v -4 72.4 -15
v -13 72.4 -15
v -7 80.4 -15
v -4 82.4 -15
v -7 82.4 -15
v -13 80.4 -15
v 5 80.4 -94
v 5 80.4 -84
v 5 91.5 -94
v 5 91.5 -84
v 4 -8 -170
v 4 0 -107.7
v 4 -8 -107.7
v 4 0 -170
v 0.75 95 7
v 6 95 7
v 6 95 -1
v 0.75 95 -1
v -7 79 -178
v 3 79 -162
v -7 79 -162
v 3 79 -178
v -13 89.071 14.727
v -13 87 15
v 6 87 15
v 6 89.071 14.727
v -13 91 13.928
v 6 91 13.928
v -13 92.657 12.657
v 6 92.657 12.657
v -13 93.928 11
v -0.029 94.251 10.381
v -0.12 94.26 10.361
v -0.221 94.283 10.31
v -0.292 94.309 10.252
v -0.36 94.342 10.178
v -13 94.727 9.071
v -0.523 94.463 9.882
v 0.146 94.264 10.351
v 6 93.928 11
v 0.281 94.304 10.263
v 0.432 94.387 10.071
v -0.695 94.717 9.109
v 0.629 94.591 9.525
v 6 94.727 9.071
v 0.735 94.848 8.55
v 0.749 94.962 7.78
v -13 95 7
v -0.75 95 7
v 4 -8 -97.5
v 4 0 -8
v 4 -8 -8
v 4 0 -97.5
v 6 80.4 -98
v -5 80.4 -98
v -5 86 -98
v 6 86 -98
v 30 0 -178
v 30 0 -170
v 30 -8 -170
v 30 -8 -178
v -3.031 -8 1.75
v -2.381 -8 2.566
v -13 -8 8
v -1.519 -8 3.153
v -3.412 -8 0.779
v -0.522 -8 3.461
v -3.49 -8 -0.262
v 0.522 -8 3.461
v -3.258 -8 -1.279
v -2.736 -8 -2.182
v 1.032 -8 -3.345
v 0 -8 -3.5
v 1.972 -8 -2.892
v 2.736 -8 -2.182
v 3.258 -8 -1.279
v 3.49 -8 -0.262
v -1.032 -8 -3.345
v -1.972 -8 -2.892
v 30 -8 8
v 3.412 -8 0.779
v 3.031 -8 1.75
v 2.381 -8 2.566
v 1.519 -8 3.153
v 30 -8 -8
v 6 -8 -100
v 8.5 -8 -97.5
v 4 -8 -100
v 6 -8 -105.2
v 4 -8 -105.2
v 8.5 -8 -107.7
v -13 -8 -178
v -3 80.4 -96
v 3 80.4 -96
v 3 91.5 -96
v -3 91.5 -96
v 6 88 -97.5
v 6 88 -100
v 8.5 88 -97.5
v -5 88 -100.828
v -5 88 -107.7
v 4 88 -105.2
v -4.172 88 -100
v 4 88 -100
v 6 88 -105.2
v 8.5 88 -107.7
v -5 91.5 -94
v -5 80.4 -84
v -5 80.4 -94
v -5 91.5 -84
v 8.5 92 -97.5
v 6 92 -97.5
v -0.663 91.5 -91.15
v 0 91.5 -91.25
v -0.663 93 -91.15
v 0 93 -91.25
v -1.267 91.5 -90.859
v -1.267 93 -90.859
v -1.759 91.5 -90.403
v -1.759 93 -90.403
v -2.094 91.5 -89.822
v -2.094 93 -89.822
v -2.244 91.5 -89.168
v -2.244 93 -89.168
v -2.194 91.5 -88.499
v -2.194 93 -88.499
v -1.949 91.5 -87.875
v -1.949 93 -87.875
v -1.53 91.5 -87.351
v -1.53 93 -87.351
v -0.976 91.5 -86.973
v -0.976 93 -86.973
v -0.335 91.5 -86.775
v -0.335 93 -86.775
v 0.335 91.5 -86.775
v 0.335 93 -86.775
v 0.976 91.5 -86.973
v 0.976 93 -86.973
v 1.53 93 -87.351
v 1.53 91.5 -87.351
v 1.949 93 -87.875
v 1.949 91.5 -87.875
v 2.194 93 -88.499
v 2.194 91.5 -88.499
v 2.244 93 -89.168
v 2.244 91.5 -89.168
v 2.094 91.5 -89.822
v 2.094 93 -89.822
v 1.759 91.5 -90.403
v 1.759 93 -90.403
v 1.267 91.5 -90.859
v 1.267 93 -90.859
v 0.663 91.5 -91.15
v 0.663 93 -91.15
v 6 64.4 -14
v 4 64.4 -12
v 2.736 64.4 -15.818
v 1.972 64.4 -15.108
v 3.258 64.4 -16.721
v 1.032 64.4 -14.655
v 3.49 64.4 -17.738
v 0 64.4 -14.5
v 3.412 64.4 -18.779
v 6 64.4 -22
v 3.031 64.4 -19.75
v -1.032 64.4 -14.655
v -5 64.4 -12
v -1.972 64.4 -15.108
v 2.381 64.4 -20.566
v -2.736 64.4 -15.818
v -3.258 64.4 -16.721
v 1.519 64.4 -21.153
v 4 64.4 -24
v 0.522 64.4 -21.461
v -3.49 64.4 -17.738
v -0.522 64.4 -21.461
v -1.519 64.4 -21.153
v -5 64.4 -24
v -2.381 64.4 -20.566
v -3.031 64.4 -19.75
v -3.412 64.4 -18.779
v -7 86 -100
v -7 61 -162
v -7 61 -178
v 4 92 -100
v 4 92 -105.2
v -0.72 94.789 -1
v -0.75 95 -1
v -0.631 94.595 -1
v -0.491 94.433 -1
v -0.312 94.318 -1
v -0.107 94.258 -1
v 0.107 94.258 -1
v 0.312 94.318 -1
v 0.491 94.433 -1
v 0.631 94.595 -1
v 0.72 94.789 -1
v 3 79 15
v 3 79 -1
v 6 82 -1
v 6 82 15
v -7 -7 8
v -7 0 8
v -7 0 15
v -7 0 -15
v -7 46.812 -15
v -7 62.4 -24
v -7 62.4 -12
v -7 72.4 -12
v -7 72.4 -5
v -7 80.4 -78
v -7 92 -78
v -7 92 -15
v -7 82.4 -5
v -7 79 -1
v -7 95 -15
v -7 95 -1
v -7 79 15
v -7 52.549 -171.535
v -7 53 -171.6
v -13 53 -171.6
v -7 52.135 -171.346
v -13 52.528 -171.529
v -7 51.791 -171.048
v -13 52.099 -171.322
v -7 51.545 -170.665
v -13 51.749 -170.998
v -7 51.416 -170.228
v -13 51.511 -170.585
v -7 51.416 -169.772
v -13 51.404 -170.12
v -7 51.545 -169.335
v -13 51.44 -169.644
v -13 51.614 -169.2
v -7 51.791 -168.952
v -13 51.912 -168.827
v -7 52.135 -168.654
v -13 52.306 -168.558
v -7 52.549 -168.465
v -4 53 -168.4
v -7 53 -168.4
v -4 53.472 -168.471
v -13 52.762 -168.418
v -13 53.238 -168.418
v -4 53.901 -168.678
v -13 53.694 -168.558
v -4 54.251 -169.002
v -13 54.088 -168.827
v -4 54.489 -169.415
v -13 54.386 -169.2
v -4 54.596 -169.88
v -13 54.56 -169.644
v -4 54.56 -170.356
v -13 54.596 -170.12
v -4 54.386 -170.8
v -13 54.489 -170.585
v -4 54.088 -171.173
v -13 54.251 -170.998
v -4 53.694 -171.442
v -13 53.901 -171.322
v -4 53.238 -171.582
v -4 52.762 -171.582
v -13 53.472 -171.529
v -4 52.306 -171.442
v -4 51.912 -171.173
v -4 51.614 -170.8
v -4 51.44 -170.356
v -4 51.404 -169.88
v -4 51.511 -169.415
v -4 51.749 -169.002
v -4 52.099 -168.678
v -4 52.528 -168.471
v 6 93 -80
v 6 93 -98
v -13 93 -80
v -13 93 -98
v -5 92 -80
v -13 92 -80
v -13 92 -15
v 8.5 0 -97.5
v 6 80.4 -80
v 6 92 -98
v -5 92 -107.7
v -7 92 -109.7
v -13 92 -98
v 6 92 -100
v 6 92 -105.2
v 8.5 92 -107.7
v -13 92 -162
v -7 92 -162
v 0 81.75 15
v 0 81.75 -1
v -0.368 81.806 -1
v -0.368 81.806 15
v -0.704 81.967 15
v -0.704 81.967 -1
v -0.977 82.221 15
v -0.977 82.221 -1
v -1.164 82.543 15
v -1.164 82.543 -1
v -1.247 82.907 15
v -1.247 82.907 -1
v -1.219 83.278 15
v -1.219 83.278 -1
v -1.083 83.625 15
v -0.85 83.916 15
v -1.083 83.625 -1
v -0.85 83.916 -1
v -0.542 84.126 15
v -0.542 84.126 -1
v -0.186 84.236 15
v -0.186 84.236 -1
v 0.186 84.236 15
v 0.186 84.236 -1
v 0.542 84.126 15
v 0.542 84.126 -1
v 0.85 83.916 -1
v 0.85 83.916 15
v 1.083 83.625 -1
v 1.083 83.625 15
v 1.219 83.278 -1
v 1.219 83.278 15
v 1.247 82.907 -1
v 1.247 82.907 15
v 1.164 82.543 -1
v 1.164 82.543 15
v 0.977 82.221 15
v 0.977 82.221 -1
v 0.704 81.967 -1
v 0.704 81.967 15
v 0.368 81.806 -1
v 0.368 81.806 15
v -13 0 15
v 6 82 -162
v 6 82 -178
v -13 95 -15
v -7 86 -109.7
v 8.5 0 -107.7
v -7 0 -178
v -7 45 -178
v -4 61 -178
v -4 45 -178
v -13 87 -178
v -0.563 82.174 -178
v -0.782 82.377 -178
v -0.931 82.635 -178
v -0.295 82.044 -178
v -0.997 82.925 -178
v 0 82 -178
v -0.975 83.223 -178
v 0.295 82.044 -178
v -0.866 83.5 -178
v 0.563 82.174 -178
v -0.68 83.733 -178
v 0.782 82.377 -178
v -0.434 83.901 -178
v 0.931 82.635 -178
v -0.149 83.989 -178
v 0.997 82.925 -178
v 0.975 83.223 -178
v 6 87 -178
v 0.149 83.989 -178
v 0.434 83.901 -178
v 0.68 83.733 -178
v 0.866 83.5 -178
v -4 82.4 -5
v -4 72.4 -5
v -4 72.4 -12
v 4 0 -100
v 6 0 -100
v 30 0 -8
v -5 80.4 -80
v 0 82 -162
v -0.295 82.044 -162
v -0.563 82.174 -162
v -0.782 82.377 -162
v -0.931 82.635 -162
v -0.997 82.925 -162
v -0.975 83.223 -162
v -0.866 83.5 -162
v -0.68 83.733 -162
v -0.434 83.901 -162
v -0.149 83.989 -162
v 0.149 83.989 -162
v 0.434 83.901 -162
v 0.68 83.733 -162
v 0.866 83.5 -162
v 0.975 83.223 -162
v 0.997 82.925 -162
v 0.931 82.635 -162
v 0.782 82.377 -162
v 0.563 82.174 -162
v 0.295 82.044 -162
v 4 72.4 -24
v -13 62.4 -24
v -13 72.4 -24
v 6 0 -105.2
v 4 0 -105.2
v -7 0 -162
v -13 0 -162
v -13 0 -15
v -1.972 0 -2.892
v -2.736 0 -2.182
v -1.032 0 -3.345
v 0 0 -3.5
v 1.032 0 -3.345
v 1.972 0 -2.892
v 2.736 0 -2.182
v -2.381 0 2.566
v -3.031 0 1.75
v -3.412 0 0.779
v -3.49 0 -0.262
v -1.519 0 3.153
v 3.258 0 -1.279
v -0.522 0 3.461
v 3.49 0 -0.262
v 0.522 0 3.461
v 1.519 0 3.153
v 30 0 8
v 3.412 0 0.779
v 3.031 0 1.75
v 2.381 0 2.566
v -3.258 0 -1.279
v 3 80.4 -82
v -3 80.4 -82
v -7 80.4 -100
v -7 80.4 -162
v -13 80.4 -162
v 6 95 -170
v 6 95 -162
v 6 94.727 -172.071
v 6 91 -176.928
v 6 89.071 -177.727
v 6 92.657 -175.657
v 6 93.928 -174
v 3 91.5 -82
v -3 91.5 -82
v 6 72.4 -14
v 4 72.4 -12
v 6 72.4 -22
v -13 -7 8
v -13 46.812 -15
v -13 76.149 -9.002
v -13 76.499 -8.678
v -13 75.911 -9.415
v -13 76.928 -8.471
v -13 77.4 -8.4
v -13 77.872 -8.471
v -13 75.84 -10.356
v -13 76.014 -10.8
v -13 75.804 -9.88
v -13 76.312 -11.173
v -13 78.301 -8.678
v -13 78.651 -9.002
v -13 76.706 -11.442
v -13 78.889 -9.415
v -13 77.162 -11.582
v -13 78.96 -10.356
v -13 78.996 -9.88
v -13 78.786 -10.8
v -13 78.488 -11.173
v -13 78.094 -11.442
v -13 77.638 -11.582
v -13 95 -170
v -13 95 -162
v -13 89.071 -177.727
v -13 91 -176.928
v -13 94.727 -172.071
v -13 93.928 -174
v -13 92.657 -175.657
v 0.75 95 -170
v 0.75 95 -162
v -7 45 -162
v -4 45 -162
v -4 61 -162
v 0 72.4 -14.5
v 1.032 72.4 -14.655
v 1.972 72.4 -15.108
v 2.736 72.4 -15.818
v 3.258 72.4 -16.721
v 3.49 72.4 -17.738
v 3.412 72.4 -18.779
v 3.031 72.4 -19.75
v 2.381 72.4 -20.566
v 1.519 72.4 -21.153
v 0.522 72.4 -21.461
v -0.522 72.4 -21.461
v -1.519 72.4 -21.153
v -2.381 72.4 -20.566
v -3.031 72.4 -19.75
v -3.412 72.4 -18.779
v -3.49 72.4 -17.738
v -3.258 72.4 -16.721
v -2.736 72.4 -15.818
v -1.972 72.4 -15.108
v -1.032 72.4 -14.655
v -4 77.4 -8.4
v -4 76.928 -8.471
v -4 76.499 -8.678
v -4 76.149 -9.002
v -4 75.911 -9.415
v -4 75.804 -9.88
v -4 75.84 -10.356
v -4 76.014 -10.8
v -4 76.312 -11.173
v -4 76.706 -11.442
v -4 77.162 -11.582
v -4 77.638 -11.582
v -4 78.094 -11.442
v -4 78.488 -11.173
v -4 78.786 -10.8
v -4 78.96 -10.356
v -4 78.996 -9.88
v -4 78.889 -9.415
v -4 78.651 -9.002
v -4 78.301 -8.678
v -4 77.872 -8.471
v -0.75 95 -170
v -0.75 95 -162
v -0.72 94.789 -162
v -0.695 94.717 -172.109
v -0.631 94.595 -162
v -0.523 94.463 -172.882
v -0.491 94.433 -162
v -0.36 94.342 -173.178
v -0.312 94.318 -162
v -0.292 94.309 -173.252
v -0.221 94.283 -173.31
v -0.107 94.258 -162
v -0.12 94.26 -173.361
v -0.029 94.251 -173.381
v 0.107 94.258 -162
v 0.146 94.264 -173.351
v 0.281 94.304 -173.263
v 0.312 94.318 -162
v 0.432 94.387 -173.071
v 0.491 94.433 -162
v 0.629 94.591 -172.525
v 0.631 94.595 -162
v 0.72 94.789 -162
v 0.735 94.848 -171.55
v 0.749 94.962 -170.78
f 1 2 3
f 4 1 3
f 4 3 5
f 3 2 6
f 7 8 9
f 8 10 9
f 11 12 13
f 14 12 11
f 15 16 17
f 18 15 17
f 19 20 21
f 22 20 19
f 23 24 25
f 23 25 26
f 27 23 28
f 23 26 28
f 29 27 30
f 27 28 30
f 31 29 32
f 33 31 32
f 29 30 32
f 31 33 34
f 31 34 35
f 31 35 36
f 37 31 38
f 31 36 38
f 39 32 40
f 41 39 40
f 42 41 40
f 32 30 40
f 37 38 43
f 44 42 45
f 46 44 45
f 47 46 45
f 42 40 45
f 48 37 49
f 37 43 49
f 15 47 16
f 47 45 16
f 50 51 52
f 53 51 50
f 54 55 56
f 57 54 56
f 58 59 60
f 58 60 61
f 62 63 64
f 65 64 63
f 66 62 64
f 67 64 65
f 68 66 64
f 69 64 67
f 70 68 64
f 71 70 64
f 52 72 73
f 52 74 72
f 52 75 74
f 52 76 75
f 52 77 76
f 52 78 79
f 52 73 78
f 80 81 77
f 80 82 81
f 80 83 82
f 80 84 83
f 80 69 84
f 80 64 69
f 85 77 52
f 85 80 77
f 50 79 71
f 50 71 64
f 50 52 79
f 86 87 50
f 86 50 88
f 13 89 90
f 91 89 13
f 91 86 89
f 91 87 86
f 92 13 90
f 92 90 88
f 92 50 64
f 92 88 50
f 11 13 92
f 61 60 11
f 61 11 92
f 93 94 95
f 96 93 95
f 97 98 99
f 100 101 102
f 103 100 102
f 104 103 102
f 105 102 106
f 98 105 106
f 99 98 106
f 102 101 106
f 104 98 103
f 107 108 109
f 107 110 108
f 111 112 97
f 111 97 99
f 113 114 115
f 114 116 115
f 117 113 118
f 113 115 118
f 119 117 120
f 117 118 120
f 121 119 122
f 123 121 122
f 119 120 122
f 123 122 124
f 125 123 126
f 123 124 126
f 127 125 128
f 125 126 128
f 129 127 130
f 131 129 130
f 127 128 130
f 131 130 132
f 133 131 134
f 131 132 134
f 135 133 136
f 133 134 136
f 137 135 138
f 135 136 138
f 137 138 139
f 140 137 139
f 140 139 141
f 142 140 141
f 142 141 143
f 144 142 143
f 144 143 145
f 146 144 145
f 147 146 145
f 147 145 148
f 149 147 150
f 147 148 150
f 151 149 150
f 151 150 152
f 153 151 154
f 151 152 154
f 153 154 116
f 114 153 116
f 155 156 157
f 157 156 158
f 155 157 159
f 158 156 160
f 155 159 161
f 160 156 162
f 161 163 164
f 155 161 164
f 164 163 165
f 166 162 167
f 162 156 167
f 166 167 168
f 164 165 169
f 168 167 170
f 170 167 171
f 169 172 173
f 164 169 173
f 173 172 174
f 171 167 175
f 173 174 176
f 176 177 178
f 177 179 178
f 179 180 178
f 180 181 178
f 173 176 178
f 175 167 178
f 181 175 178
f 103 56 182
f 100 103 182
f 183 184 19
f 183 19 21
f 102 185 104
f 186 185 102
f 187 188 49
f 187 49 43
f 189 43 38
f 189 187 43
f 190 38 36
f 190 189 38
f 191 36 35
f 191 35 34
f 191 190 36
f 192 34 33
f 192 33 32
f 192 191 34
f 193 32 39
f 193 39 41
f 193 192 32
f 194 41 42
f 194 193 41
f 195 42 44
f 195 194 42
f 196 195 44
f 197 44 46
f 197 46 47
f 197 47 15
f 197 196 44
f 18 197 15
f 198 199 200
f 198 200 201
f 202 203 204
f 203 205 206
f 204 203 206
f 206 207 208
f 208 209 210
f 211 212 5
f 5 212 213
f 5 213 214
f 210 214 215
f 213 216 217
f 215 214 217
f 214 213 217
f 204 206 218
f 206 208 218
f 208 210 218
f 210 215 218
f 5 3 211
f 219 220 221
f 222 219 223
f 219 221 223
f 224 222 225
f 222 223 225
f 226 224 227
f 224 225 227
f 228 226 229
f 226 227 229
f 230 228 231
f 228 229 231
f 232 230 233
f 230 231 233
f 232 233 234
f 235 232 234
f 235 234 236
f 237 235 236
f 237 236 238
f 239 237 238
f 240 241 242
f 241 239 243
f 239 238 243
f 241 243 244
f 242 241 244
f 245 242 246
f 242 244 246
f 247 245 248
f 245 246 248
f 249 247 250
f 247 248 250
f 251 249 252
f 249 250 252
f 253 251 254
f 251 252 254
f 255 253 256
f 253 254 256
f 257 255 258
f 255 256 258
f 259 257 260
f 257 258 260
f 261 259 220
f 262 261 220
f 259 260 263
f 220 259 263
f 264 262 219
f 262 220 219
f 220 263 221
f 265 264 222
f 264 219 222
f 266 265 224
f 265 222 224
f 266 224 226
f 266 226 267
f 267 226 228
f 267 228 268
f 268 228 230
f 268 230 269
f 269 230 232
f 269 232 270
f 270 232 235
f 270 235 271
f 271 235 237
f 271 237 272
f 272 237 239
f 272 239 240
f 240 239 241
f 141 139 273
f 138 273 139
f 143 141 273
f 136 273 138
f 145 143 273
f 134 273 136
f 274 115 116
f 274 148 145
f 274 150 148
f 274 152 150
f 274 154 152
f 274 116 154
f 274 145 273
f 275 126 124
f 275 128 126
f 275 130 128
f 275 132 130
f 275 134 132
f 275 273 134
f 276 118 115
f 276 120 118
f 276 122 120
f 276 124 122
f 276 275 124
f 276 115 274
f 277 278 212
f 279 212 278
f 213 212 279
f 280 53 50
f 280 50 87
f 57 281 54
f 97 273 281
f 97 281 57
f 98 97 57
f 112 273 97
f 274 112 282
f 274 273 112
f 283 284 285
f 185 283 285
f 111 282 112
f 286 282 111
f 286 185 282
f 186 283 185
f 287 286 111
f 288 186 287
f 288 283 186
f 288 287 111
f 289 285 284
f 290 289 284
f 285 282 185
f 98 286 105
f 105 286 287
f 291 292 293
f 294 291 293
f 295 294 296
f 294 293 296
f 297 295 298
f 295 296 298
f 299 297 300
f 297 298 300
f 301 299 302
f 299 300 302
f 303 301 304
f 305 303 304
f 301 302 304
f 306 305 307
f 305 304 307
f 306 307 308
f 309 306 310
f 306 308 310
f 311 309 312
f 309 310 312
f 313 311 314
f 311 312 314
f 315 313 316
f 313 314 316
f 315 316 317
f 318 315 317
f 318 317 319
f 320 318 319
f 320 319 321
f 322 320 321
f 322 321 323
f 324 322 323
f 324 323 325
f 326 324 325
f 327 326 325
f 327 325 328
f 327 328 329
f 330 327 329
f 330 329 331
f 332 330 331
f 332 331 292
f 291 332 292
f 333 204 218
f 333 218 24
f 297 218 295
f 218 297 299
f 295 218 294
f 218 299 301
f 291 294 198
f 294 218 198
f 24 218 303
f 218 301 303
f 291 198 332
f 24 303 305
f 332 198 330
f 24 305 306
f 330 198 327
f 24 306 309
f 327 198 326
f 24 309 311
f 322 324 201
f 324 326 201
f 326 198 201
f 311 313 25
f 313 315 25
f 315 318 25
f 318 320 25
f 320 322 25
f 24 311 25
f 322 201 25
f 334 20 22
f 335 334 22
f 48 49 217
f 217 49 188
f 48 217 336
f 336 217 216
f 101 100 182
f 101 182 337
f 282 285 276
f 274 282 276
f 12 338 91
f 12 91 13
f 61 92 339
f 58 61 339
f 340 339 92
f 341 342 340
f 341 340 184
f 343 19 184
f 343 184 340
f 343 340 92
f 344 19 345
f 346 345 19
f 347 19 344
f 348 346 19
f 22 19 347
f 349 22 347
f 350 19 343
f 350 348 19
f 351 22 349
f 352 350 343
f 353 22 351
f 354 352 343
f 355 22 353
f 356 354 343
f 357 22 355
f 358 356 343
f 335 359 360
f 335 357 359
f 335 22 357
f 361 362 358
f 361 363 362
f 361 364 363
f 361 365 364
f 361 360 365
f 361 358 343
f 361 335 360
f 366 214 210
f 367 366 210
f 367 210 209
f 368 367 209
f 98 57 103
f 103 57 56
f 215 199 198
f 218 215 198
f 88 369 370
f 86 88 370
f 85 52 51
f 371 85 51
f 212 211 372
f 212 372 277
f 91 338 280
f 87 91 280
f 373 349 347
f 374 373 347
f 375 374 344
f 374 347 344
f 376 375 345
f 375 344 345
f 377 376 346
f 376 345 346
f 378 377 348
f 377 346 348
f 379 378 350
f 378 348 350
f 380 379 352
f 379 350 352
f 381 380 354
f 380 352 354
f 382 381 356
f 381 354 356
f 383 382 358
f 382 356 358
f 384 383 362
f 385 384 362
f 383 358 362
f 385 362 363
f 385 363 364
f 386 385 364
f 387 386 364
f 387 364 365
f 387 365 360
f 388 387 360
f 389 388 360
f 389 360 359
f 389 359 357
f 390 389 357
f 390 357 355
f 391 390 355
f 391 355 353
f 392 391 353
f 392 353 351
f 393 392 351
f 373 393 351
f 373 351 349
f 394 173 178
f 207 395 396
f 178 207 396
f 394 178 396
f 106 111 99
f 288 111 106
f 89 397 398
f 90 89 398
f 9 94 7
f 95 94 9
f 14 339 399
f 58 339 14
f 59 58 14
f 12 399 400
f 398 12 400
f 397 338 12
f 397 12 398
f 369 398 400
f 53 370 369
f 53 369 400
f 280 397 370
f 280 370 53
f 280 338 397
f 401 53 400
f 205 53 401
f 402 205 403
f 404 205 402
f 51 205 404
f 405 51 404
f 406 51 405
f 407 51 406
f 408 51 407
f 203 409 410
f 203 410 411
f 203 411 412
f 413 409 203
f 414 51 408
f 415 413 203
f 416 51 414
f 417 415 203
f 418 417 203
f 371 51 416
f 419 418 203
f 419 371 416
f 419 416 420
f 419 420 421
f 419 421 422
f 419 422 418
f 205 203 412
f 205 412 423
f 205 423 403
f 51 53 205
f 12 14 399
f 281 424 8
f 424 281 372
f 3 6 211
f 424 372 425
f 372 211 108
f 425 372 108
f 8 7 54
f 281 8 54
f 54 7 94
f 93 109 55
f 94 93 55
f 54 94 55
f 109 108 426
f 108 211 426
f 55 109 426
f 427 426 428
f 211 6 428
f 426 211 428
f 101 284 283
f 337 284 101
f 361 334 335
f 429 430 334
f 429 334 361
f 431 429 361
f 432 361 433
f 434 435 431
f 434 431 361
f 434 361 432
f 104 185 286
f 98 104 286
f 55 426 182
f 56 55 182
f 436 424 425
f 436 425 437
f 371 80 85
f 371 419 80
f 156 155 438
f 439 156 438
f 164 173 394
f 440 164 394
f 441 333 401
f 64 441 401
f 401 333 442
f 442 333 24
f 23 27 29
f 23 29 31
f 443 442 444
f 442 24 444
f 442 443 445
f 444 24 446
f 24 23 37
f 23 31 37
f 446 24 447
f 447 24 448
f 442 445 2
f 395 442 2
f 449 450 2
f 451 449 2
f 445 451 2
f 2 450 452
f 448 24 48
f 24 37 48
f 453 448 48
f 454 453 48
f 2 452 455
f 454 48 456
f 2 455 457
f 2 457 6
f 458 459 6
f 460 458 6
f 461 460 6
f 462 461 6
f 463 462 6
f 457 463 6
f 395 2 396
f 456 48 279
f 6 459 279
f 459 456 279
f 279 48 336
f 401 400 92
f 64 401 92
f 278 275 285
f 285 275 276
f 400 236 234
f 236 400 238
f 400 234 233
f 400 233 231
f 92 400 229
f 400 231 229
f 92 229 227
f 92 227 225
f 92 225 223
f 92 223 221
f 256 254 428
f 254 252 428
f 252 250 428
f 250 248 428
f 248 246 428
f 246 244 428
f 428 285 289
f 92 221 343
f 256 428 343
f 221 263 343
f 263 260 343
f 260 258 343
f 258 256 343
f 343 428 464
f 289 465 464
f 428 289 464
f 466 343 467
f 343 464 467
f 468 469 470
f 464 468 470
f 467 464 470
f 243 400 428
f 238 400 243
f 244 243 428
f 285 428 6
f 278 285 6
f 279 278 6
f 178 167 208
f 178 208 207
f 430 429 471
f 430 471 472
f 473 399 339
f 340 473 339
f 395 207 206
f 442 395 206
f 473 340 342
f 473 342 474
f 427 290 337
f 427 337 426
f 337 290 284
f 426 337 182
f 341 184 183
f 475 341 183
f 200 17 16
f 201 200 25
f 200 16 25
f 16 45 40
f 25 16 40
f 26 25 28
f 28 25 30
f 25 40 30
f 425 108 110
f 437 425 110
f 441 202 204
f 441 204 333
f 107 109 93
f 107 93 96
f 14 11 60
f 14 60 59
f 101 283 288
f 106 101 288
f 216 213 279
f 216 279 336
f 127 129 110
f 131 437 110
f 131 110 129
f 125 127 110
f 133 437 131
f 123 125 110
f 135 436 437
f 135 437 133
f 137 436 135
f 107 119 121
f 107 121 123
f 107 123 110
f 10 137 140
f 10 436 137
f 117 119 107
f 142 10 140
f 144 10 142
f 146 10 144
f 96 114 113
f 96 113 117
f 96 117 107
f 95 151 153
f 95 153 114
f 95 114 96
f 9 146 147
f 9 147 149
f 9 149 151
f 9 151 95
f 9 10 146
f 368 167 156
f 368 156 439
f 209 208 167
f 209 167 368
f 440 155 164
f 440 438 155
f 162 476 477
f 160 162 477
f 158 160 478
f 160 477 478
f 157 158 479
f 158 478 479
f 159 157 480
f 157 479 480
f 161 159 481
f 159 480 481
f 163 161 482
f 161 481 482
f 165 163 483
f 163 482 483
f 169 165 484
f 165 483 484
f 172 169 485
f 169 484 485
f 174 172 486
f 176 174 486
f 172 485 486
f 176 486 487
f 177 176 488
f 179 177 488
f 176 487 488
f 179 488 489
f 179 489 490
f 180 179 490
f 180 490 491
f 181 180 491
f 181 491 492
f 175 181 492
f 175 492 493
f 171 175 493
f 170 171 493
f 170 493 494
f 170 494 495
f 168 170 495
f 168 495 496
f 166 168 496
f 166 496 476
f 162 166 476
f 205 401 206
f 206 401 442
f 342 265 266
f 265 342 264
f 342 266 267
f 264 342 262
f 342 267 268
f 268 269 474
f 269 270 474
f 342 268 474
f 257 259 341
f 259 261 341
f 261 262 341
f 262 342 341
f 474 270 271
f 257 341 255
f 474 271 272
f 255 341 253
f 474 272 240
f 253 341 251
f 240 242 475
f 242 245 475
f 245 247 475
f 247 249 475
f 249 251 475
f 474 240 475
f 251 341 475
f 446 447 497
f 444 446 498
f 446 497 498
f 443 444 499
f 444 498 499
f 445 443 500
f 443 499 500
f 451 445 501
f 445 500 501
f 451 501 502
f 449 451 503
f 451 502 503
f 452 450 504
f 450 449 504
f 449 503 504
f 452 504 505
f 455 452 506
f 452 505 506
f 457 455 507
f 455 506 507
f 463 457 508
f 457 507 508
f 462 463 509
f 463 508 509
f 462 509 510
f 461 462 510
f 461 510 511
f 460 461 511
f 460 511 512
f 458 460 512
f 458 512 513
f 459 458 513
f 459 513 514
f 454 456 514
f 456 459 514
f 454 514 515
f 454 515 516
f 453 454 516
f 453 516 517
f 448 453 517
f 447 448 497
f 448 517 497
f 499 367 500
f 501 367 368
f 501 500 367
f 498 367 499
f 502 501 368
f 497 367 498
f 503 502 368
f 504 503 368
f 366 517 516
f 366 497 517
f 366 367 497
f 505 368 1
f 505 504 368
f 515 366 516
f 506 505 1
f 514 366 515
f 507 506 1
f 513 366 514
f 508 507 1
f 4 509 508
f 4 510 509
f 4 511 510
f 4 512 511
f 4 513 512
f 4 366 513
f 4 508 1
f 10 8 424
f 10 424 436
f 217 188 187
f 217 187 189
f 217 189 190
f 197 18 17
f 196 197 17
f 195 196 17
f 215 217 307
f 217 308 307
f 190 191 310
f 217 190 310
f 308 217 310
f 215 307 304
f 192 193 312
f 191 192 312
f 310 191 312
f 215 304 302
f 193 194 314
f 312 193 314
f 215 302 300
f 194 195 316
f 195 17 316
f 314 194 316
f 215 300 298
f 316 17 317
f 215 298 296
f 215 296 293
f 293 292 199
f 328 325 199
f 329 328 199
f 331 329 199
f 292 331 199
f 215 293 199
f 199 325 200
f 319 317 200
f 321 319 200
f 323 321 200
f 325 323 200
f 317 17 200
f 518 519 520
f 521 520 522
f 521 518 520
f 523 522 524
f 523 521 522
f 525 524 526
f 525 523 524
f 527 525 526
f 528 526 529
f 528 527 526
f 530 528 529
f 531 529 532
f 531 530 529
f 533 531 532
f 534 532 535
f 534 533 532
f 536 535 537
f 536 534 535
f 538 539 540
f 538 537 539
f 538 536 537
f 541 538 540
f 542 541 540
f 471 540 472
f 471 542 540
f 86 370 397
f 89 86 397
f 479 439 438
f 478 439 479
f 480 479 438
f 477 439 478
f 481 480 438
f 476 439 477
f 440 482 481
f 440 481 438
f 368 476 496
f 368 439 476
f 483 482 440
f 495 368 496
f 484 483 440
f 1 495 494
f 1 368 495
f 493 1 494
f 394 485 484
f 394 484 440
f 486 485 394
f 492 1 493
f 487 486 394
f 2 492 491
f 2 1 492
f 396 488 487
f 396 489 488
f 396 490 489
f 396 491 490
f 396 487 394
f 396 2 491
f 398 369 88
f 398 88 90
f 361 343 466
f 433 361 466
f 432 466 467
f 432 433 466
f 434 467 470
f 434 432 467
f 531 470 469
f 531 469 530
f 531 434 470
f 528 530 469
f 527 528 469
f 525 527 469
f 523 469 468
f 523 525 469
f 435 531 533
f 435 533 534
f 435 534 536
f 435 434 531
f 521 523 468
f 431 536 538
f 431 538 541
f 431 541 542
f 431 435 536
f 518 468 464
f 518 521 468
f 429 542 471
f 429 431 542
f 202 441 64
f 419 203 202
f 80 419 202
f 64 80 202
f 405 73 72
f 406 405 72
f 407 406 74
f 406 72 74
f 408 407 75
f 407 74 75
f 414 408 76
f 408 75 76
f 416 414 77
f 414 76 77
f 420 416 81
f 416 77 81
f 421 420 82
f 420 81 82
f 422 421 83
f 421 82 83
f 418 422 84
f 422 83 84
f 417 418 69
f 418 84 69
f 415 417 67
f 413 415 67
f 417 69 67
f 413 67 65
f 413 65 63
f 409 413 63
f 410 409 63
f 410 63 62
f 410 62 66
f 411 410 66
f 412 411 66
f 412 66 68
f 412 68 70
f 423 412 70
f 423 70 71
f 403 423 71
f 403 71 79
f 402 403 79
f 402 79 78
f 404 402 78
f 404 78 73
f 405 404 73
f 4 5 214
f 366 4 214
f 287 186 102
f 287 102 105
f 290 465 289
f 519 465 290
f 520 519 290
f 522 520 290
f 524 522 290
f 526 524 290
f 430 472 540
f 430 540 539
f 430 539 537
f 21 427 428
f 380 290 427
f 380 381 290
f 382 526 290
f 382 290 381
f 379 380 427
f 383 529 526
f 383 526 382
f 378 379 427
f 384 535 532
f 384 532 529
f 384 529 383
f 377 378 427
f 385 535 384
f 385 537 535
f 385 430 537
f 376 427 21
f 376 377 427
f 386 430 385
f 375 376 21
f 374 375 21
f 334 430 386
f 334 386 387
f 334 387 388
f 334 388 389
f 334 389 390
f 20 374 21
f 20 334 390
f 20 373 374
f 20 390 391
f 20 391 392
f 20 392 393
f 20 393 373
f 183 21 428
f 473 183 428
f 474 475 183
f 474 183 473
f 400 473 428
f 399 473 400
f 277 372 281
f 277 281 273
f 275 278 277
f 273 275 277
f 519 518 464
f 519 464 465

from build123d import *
from build123d.topology import SkipClean

# Parameters (mm, degrees)
BOSS_EXTRUDE1_DEPTH             = 4
SKETCH2_W                       = 8
SKETCH2_H                       = 8
BOSS_EXTRUDE2_DEPTH             = 26
BOSS_EXTRUDE3_DEPTH             = 7
BOSS_EXTRUDE4_DEPTH             = 6
BOSS_EXTRUDE6_DEPTH             = 3
BOSS_EXTRUDE7_DEPTH             = 3
F_7_0MM_DOWEL_HOLE1_D           = 7
SKETCH6_W                       = 1.6
SKETCH6_H                       = 6
SKETCH9_W                       = 1.6
SKETCH9_H                       = 37
M3_CLEARANCE_HOLE4_D            = 3.2
BOSS_EXTRUDE8_DEPTH             = 8
BOSS_EXTRUDE9_DEPTH             = 6
SKETCH15_W                      = 12
SKETCH15_H                      = 8
BOSS_EXTRUDE10_DEPTH            = 13
CHAMFER1_SIZE                   = 2
CUT_EXTRUDE1_REACH              = 199.606
SKETCH16_R                      = 3.5
CHAMFER2_SIZE                   = 2
BOSS_EXTRUDE11_START            = 13
BOSS_EXTRUDE11_DEPTH            = 13
CUT_EXTRUDE2_DEPTH              = 218.195764231
CUT_EXTRUDE2_DEPTH_BACK         = 218.195764231
SKETCH18_R                      = 0.75
TAP_DRILL_FOR_M3X0_5_TAP1_D     = 2.5
TAP_DRILL_FOR_M3X0_5_TAP1_DEPTH = 16
F_2_0MM_DOWEL_HOLE4_D           = 2
CHAMFER3_SIZE                   = 3
BOSS_EXTRUDE12_START            = -13
SKETCH24_W                      = 18
SKETCH24_H                      = 12.6
BOSS_EXTRUDE12_DEPTH            = 19
SKETCH25_W                      = 14
SKETCH25_H                      = 11.1
CUT_EXTRUDE3_DEPTH              = 5
CHAMFER4_SIZE                   = 2
SKETCH26_W                      = 2.25
SKETCH26_H                      = 1.5
SKETCH27_W                      = 15.5
SKETCH27_H                      = 10.2
SKETCH27_W_2                    = 2
SKETCH27_H_2                    = 5.2
BOSS_EXTRUDE13_DEPTH            = 4
CHAMFER5_SIZE                   = 2
CHAMFER6_SIZE                   = 7


with BuildPart() as part:
    # Sketch1 → Boss-Extrude1 (new body)
    with BuildSketch(Plane(origin=(0, 0, 0), x_dir=(0, 0, -1), z_dir=(1, 0, 0))):
        Polygon((0, 0), (-8, 0), (-8, -8), (178, -8), (178, 0), (170, 0), align=None)
    extrude(amount=BOSS_EXTRUDE1_DEPTH)

    # Sketch2 → Boss-Extrude2 (add)
    with BuildSketch(Plane(origin=(4, 0, 0), x_dir=(0, 0, -1), z_dir=(1, 0, 0))):
        Polygon((-8, -8), (0, -8), (8, -8), (8, 0), (0, 0), (-8, 0), align=None)
        with Locations((174, -4)):
            Rectangle(SKETCH2_W, SKETCH2_H)
    extrude(amount=BOSS_EXTRUDE2_DEPTH)

    # Sketch1<2> → Boss-Extrude3 (add)
    with BuildSketch(Plane(origin=(0, 0, 0), x_dir=(0, 0, -1), z_dir=(1, 0, 0))):
        Polygon((0, 0), (-8, 0), (-8, -8), (178, -8), (178, 0), (170, 0), align=None)
    extrude(amount=-BOSS_EXTRUDE3_DEPTH)

    # Sketch4 → Boss-Extrude4 (add)
    with BuildSketch(Plane.ZY.offset(7)):
        with BuildLine():
            Line((-178, 0), (-178, 87))
            ThreePointArc((-178, 87), (-175.656854249, 92.656854249), (-170, 95))
            Line((-170, 95), (-162, 95))
            Line((-162, 95), (-162, 92))
            Line((-162, 92), (-15, 92))
            Line((-15, 92), (-15, 95))
            Line((-15, 95), (2.4, 95))
            Line((2.4, 95), (7, 95))
            ThreePointArc((7, 95), (12.656854249, 92.656854249), (15, 87))
            Line((15, 87), (15, 77.4))
            Line((15, 77.4), (15, 2.4))
            Line((15, 2.4), (15, 0))
            Line((15, 0), (8, 0))
            Line((8, 0), (8, -8))
            Line((8, -8), (-178, -8))
            Line((-178, -8), (-178, 0))
        make_face()
        Polygon((-15, 2.4), (-15, 0), (-162, 0), (-162, 80.4), (-15, 80.4), (-15, 77.4), align=None, mode=Mode.SUBTRACT)
    extrude(amount=BOSS_EXTRUDE4_DEPTH)

    # Sketch10 → Boss-Extrude6 (add)
    with BuildSketch(Plane(origin=(-7, 0, 0), x_dir=(0, 0, -1), z_dir=(1, 0, 0))):
        Polygon((15, 82.4), (5, 82.4), (5, 72.4), (10, 72.4), (15, 72.4), (15, 77.4), align=None)
    extrude(amount=BOSS_EXTRUDE6_DEPTH)

    # Sketch10<3> → Boss-Extrude7 (add)
    with BuildSketch(Plane(origin=(-7, 0, 0), x_dir=(0, 0, -1), z_dir=(1, 0, 0))):
        Polygon((170, 61), (178, 61), (178, 53), (178, 45), (162, 45), (162, 61), align=None)
    extrude(amount=BOSS_EXTRUDE7_DEPTH)

    # Ø7.0mm Dowel Hole1 (through all)
    with Locations(Plane.ZX):
        with Locations((0, 0)):
            Hole(F_7_0MM_DOWEL_HOLE1_D / 2)

    # Sketch6 → M3 Clearance Hole2 (revolve, cut)
    with BuildSketch(Plane(origin=(-7, 53, -170), x_dir=(0, 0, -1), z_dir=(0, 1, 0))):
        with Locations((0.8, 3)):
            Rectangle(SKETCH6_W, SKETCH6_H)
    revolve(axis=Axis((-0.65, 53, -170), (-1, 0, 0)), mode=Mode.SUBTRACT)

    # Sketch9 → M3 Clearance Hole3 (revolve, cut)
    with BuildSketch(Plane(origin=(-7, 77.4, -10), x_dir=(0, 0, 1), z_dir=(0, 1, 0))):
        with Locations((0.8, 18.5)):
            Rectangle(SKETCH9_W, SKETCH9_H)
    revolve(axis=Axis((-13.35, 77.4, -10), (1, 0, 0)), mode=Mode.SUBTRACT)

    # M3 Clearance Hole4 (through all)
    with Locations(Plane(origin=(0, 0, 0), x_dir=(0, 0, -1), z_dir=(1, 0, 0))):
        with Locations((10, 77.4), (170, 53)):
            Hole(M3_CLEARANCE_HOLE4_D / 2)

    # Sketch13 → Boss-Extrude8 (add)
    with BuildSketch(Plane(origin=(0, 0, 0), x_dir=(1, 0, 0), z_dir=(0, 1, 0))):
        Polygon((6, 107.7), (8.5, 107.7), (8.5, 97.5), (6, 97.5), (4, 97.5), (4, 100), (6, 100), (6, 105.2), (4, 105.2), (4, 107.7), align=None)
    extrude(amount=-BOSS_EXTRUDE8_DEPTH)

    # Sketch14 → Boss-Extrude9 (add)
    with BuildSketch(Plane(origin=(-7, 0, 0), x_dir=(0, 0, -1), z_dir=(1, 0, 0))):
        Polygon((15, 72.4), (24, 72.4), (24, 62.4), (15, 46.811542732), align=None)
    extrude(amount=-BOSS_EXTRUDE9_DEPTH)

    # Sketch15 → Boss-Extrude10 (add)
    with BuildSketch(Plane(origin=(-7, 0, 0), x_dir=(0, 0, -1), z_dir=(1, 0, 0))):
        with Locations((18, 68.4)):
            Rectangle(SKETCH15_W, SKETCH15_H)
    extrude(amount=BOSS_EXTRUDE10_DEPTH)

    # Chamfer1
    chamfer1_edges = [part.edges().sort_by_distance(p)[0] for p in [
        (-7, 64.4, -18),
    ]]
    chamfer(chamfer1_edges, length=CHAMFER1_SIZE)

    # Sketch16 → Cut-Extrude1 (cut, up to next)
    with BuildSketch(Plane(origin=(0, 72.4, 0), x_dir=(1, 0, 0), z_dir=(0, 1, 0)), mode=Mode.PRIVATE) as cut_extrude1_sk1:
        with Locations(Location((0, 18, 0), (0, 0, 270))):
            Circle(SKETCH16_R)
    cut_extrude1_tool1 = extrude(cut_extrude1_sk1.sketch, amount=-CUT_EXTRUDE1_REACH, mode=Mode.PRIVATE) & part.part
    add(cut_extrude1_tool1.solids().sort_by_distance((0, 72.4, -18))[0], mode=Mode.SUBTRACT)

    # Chamfer2
    chamfer2_edges = [part.edges().sort_by_distance(p)[0] for p in [
        (6, 68.4, -24),
        (6, 68.4, -12),
    ]]
    chamfer(chamfer2_edges, length=CHAMFER2_SIZE)

    # Sketch17 → Boss-Extrude11 (add)
    with BuildSketch(Plane(origin=(-7, 0, 0), x_dir=(0, 0, -1), z_dir=(1, 0, 0)).offset(BOSS_EXTRUDE11_START)):
        with BuildLine():
            Line((1, 95), (1, 79))
            Line((1, 79), (-15, 79))
            Line((-15, 79), (-15, 87))
            ThreePointArc((-15, 87), (-12.656854249, 92.656854249), (-7, 95))
            Line((-7, 95), (1, 95))
        make_face()
        with BuildLine():
            Line((170, 95), (162, 95))
            Line((162, 95), (162, 79))
            Line((162, 79), (178, 79))
            Line((178, 79), (178, 87))
            ThreePointArc((178, 87), (175.656854249, 92.656854249), (170, 95))
        make_face()
    extrude(amount=-BOSS_EXTRUDE11_DEPTH)

    # Sketch18 → Cut-Extrude2 (cut, two sides: drawn at the far end of the back side and taken through both)
    with BuildSketch(Plane.XY.offset(15).offset(-CUT_EXTRUDE2_DEPTH_BACK)):
        with Locations((0, 95)):
            Circle(SKETCH18_R)
    extrude(amount=CUT_EXTRUDE2_DEPTH + CUT_EXTRUDE2_DEPTH_BACK, mode=Mode.SUBTRACT)

    # Tap Drill for M3x0.5 Tap1
    with Locations(Plane(origin=(0, 83, 15), x_dir=(0, 1, 0), z_dir=(0, 0, 1))):
        with Locations((0, 0)):
            Hole(TAP_DRILL_FOR_M3X0_5_TAP1_D / 2, depth=TAP_DRILL_FOR_M3X0_5_TAP1_DEPTH)

    # Ø2.0mm Dowel Hole4 (through all)
    with Locations(Plane(origin=(0, 83, 15), x_dir=(0, 1, 0), z_dir=(0, 0, 1))):
        with Locations((0, 0)):
            Hole(F_2_0MM_DOWEL_HOLE4_D / 2)

    # Chamfer3
    chamfer3_edges = [part.edges().sort_by_distance(p)[0] for p in [
        (6, 79, 7),
        (6, 79, -170),
    ]]
    chamfer(chamfer3_edges, length=CHAMFER3_SIZE)

    # Sketch24 → Boss-Extrude12 (add)
    with SkipClean():  # the faces are left unmerged after this step: merging them gives an invalid solid
        with BuildSketch(Plane(origin=(0, 0, 0), x_dir=(0, 0, -1), z_dir=(1, 0, 0)).offset(BOSS_EXTRUDE12_START)):
            with Locations((89, 86.7)):
                Rectangle(SKETCH24_W, SKETCH24_H)
        extrude(amount=BOSS_EXTRUDE12_DEPTH)

    # Sketch25 → Cut-Extrude3 (cut, symmetric)
    with SkipClean():  # the faces are left unmerged after this step: merging them gives an invalid solid
        with BuildSketch(Plane(origin=(0, 0, 0), x_dir=(0, 0, -1), z_dir=(1, 0, 0))):
            with Locations((89, 85.95)):
                Rectangle(SKETCH25_W, SKETCH25_H)
        extrude(amount=CUT_EXTRUDE3_DEPTH, both=True, mode=Mode.SUBTRACT)

    # Chamfer4
    chamfer4_edges = [part.edges().sort_by_distance(p)[0] for p in [
        (-7, 86.2, -80),
        (-7, 86.2, -98),
        (-5, 85.95, -82),
        (-5, 85.95, -96),
        (5, 85.95, -82),
        (5, 85.95, -96),
    ]]
    chamfer(chamfer4_edges, length=CHAMFER4_SIZE)

    # Sketch26 → Cut-Revolve1 (revolve, cut)
    with SkipClean():  # the faces are left unmerged after this step: merging them gives an invalid solid
        with BuildSketch(Plane(origin=(0, 0, 0), x_dir=(0, 0, -1), z_dir=(1, 0, 0)), mode=Mode.PRIVATE) as cut_revolve1_sk:
            with Locations((87.875, 92.25)):
                Rectangle(SKETCH26_W, SKETCH26_H)
        revolve(cut_revolve1_sk.sketch.rotate(Axis((0, 65.518758018, -89), (0, 1, 0)), 180), axis=Axis((0, 65.518758018, -89), (0, 1, 0)), mode=Mode.SUBTRACT)

    # Sketch27 → Boss-Extrude13 (add)
    with SkipClean():  # the faces are left unmerged after this step: merging them gives an invalid solid
        with BuildSketch(Plane(origin=(0, 92, 0), x_dir=(1, 0, 0), z_dir=(0, 1, 0))):
            with Locations((0.75, 102.6)):
                Rectangle(SKETCH27_W, SKETCH27_H)
            with Locations((5, 102.6)):
                Rectangle(SKETCH27_W_2, SKETCH27_H_2, mode=Mode.SUBTRACT)
        extrude(amount=-BOSS_EXTRUDE13_DEPTH)

    # Chamfer5
    chamfer5_edges = [part.edges().sort_by_distance(p)[0] for p in [
        (-6, 88, -99),
        (-7, 88, -103.85),
        (-7, 90, -107.7),
        (0.5, 88, -98),
    ]]
    chamfer(chamfer5_edges, length=CHAMFER5_SIZE - 0.0001)  # a hair under: the kernel refuses the full size

    # Chamfer6
    chamfer6_edges = [part.edges().sort_by_distance(p)[0] for p in [
        (-10, 0, 8),
    ]]
    chamfer(chamfer6_edges, length=CHAMFER6_SIZE - 0.0001)  # a hair under: the kernel refuses the full size


solid = part.part
